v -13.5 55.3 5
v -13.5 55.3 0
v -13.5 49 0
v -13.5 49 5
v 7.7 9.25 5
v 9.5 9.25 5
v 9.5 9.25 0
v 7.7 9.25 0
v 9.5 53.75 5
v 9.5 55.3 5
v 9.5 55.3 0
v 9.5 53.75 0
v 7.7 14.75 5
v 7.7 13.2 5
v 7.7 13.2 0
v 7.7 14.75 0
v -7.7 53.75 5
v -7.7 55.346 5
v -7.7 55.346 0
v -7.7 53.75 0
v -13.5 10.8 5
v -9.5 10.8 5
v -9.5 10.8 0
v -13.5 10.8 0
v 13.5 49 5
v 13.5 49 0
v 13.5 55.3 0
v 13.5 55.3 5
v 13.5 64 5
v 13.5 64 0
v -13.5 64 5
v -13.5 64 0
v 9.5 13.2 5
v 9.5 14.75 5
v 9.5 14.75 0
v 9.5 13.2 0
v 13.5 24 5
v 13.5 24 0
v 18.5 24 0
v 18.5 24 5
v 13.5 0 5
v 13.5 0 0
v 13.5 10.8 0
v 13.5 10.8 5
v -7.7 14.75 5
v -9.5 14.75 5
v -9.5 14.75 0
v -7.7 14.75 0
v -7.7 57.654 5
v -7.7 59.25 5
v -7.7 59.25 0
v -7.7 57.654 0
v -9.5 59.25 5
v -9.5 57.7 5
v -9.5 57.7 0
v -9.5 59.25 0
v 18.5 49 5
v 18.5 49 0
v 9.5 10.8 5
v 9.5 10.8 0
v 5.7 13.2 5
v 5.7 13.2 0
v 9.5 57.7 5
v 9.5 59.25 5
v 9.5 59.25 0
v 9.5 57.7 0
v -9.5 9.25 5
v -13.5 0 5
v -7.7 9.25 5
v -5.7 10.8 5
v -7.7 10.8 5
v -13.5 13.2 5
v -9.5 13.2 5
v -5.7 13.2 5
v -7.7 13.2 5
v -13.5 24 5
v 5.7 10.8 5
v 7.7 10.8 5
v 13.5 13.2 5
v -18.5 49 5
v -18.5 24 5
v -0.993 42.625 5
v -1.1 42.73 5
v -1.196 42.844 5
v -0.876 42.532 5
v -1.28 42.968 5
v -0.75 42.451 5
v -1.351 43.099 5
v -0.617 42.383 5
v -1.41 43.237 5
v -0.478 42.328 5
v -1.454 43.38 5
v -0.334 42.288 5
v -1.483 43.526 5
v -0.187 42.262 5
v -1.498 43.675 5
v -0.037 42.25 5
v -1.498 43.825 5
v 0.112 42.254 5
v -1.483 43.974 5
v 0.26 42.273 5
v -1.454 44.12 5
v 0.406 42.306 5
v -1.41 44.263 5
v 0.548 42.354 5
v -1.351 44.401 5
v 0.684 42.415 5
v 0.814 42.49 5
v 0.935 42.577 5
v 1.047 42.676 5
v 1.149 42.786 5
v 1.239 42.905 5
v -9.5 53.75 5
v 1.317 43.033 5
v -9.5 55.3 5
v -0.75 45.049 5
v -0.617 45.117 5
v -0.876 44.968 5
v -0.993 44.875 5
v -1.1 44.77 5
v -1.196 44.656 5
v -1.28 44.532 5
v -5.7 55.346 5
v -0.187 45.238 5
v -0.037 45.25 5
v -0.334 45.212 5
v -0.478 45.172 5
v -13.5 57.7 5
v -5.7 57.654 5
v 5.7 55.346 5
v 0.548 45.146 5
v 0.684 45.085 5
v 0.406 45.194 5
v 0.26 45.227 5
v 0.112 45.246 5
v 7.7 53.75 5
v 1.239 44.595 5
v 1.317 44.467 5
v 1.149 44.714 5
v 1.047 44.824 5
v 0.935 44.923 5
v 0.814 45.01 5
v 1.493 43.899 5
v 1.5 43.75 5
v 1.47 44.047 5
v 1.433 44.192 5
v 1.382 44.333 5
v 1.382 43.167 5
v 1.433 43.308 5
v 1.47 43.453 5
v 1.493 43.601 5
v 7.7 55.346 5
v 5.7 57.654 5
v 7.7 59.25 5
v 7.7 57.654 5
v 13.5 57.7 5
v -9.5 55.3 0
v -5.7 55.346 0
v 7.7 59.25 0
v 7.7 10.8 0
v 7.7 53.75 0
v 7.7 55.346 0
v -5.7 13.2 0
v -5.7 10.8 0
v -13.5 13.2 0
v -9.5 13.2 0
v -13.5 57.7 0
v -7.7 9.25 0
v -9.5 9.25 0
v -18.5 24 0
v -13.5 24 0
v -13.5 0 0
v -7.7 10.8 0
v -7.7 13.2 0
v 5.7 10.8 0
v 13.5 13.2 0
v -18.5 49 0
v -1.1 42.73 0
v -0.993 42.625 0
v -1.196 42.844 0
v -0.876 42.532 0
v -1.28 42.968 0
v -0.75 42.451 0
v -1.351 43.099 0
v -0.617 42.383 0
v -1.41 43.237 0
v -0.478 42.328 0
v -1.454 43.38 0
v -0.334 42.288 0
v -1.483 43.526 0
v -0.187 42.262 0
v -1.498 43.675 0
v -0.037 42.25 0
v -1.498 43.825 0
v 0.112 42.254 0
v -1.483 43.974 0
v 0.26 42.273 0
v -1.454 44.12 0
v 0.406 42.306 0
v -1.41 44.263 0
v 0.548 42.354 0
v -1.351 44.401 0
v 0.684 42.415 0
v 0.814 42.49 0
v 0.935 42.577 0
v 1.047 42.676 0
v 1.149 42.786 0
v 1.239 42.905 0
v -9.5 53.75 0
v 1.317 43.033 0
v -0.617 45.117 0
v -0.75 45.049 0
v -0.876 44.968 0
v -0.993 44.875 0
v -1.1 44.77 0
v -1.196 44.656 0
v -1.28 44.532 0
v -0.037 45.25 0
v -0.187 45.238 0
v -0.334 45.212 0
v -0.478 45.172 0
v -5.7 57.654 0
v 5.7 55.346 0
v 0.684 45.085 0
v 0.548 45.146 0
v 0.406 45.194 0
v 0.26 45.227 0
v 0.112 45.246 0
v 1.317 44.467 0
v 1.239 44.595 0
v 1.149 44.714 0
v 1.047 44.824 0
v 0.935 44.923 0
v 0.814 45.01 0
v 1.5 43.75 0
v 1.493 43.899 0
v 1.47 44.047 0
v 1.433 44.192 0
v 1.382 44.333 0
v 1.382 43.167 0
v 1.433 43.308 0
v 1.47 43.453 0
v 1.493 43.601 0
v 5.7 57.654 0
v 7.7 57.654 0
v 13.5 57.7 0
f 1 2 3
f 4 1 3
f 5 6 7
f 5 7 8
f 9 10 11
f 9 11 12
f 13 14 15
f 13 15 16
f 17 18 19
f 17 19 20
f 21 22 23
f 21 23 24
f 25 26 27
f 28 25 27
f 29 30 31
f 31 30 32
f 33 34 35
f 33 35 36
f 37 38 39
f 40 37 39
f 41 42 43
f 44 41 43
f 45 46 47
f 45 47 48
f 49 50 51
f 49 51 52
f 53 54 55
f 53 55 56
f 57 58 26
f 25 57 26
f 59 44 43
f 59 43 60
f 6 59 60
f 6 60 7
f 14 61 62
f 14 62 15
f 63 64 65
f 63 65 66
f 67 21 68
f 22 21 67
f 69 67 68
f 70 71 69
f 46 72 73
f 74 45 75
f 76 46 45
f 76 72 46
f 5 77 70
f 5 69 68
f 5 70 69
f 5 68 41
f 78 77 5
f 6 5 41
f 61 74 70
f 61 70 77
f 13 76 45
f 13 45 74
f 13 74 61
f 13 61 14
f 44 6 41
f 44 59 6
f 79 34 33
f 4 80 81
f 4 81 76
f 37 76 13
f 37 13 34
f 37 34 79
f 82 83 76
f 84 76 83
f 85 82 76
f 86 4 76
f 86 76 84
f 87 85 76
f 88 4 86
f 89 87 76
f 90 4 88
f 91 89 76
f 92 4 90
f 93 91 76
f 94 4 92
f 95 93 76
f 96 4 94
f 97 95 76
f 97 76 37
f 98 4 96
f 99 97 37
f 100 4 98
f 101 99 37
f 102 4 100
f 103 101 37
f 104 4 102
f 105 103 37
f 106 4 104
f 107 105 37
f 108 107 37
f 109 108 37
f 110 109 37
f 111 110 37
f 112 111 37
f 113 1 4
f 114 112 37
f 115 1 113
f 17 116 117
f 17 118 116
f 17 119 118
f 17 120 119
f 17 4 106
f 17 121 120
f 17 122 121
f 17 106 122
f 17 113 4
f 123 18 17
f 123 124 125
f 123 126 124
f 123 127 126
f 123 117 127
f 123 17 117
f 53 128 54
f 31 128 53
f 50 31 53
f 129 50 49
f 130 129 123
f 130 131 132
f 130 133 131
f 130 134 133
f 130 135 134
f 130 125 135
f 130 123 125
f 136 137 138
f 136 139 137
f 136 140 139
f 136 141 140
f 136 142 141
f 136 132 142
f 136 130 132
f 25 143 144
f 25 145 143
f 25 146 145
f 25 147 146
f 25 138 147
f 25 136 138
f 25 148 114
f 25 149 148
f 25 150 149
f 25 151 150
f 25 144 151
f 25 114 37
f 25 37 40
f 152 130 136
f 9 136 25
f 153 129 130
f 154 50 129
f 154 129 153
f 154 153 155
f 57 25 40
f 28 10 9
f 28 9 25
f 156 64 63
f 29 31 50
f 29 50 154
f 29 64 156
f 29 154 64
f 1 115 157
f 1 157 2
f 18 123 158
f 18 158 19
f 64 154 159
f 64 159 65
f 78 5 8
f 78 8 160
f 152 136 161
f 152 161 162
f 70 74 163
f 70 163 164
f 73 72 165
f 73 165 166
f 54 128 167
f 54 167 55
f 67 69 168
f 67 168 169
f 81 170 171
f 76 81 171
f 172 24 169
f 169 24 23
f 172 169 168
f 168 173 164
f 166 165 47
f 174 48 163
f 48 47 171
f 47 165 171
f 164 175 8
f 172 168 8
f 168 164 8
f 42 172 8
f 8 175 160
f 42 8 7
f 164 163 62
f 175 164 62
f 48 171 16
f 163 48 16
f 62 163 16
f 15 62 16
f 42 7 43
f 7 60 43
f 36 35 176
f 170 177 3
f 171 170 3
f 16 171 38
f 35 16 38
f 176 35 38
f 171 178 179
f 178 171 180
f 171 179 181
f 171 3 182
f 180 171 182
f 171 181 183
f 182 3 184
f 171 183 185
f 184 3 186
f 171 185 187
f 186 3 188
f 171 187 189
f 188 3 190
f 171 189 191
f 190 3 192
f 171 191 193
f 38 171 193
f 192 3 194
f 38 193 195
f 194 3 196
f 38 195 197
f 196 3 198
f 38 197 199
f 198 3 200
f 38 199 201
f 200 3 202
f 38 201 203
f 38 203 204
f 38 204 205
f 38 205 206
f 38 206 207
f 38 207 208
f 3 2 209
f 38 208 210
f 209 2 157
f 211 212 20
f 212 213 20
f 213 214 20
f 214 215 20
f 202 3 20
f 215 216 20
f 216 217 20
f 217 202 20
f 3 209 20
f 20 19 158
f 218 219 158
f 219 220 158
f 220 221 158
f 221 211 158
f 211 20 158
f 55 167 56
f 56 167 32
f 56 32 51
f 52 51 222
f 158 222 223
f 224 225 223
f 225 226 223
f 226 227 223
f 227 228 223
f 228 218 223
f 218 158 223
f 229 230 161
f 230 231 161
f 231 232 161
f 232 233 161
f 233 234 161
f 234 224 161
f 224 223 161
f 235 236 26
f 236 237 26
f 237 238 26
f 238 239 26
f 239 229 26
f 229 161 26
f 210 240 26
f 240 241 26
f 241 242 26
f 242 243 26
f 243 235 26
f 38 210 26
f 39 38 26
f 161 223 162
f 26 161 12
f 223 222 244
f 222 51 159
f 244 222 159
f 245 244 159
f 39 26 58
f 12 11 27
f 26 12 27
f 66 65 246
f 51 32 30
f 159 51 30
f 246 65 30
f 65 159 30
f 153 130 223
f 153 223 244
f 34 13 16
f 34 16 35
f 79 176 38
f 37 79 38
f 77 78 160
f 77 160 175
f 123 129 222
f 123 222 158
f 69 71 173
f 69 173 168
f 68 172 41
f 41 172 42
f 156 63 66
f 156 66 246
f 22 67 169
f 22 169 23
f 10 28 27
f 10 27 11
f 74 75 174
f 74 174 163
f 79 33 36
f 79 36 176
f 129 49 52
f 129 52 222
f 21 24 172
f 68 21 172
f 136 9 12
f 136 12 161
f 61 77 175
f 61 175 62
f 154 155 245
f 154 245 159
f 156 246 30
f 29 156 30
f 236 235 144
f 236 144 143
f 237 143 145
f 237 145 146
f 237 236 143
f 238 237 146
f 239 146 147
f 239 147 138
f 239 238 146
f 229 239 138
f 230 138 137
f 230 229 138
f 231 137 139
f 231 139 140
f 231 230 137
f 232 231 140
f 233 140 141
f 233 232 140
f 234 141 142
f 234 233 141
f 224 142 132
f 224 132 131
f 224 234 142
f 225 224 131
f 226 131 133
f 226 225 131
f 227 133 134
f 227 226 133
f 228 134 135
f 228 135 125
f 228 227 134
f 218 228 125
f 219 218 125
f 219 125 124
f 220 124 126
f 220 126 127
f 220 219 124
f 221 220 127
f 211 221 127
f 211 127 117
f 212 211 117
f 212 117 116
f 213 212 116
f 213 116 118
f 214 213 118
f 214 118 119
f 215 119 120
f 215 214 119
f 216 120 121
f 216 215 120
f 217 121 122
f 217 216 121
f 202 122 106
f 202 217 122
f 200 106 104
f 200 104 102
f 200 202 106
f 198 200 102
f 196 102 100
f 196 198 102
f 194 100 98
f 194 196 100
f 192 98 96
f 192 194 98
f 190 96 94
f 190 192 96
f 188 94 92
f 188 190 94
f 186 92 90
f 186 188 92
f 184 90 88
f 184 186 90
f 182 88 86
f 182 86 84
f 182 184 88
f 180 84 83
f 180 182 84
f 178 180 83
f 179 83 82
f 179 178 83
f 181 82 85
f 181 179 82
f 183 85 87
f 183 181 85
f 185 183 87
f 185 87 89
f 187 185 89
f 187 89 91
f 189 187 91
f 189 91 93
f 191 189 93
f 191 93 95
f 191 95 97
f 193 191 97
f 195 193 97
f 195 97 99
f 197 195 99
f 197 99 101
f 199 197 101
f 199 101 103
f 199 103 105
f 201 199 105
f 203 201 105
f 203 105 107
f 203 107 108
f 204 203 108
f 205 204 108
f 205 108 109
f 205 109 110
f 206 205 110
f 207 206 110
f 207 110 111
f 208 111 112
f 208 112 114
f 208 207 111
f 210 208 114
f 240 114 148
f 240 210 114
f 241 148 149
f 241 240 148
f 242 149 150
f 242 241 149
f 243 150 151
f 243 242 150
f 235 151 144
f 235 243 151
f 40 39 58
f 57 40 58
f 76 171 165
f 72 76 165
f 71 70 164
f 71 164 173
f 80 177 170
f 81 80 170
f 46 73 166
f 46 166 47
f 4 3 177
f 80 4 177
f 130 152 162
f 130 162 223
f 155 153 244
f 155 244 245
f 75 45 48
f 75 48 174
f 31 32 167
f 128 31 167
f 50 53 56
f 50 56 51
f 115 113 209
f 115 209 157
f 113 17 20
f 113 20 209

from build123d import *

# Parameters (mm, degrees)
SKETCH1_R           = 1.5
BOSS_EXTRUDE1_DEPTH = 5
CUT_EXTRUDE2_DEPTH  = 6


with BuildPart() as part:
    # Sketch1 → Boss-Extrude1 (new body)
    with BuildSketch(Plane.XY):
        Polygon((-13.5, 0), (13.5, 0), (13.5, 24), (18.5, 24), (18.5, 49), (13.5, 49), (13.5, 64), (-13.5, 64), (-13.5, 49), (-18.5, 49), (-18.5, 24), (-13.5, 24), align=None)
        with Locations((0, 43.75)):
            Circle(SKETCH1_R, mode=Mode.SUBTRACT)
    extrude(amount=BOSS_EXTRUDE1_DEPTH)

    # Sketch2 → Cut-Extrude2 (cut, through all)
    with BuildSketch(Plane.XY.offset(5)):
        Polygon((-13.5, 56.5), (-13.5, 57.7), (-9.5, 57.7), (-9.5, 59.25), (-7.7, 59.25), (-7.7, 57.654169795), (-5.7, 57.654169795), (-5.7, 55.345830205), (-7.7, 55.345830205), (-7.7, 53.75), (-9.5, 53.75), (-9.5, 55.3), (-13.5, 55.3), align=None)
        Polygon((13.5, 56.5), (13.5, 55.3), (9.5, 55.3), (9.5, 53.75), (7.7, 53.75), (7.7, 55.345830205), (5.7, 55.345830205), (5.7, 57.654169795), (7.7, 57.654169795), (7.7, 59.25), (9.5, 59.25), (9.5, 57.7), (13.5, 57.7), align=None)
        Polygon((-13.5, 10.8), (-13.5, 13.2), (-9.5, 13.2), (-9.5, 14.75), (-7.7, 14.75), (-7.7, 13.2), (-5.7, 13.2), (-5.7, 10.8), (-7.7, 10.8), (-7.7, 9.25), (-9.5, 9.25), (-9.5, 10.8), align=None)
        Polygon((13.5, 10.8), (9.5, 10.8), (9.5, 9.25), (7.7, 9.25), (7.7, 10.8), (5.7, 10.8), (5.7, 13.2), (7.7, 13.2), (7.7, 14.75), (9.5, 14.75), (9.5, 13.2), (13.5, 13.2), align=None)
    extrude(amount=-CUT_EXTRUDE2_DEPTH, mode=Mode.SUBTRACT)


solid = part.part
